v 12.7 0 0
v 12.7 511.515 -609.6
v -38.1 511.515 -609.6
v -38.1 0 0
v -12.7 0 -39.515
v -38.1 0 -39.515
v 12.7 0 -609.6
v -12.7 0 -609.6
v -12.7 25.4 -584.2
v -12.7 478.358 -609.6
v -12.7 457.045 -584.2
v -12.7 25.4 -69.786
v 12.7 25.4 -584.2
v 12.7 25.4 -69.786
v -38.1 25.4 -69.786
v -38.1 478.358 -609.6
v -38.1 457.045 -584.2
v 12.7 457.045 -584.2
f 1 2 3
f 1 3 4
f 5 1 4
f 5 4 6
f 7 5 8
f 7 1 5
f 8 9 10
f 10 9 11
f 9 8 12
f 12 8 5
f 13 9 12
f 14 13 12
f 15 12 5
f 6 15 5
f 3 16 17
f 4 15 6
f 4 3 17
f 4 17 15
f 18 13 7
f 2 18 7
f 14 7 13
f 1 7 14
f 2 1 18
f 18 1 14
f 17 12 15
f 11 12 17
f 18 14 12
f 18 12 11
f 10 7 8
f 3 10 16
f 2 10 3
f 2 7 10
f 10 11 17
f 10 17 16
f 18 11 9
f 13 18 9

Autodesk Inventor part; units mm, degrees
ref_plane "YZ Plane" through (0, 0, 0) normal (1, 0, 0) x (0, 1, 0)
ref_plane "XZ Plane" through (0, 0, 0) normal (0, 1, 0) x (-1, 0, 0)
ref_plane "XY Plane" through (0, 0, 0) normal (0, 0, 1) x (1, 0, 0)
sketch "Sketch1" plane through (0, 0, 0) normal (1, 0, 0) x (0, 1, 0)
  line L0 (0, 0) -> (0, -609.6)
  line L1 (0, -609.6) -> (511.5151, -609.6)
  line L2 (511.5151, -609.6) -> (0, 0)
  line L3 (25.4, -69.7859) -> (457.0447, -584.2)
  line L4 (457.0447, -584.2) -> (25.4, -584.2)
  line L5 (25.4, -584.2) -> (25.4, -69.7859)
  dimension "d0" = 609.6
  dimension "d1" = 40
  dimension "d2" = 25.4
  dimension "d3" = 25.4
  dimension "d4" = 25.4
extrude "Extrusion1" add sketch "Sketch1" along normal mid plane 25.4
sketch "Sketch2" plane through (-12.7, 0, 0) normal (-1, 0, 0) x (0, 0, 1)
  line L0 (-609.6, 0) -> (-609.6, 511.5151) projected
  line L1 (-609.6, 511.5151) -> (0, 0) projected
  line L2 (-609.6, 511.5151) -> (0, 0)
  line L3 (-69.7859, 25.4) -> (-584.2, 457.0447) projected
  line L4 (-584.2, 457.0447) -> (-39.5154, 0)
  line L5 (0, 0) -> (-609.6, 0) projected
  line L6 (-584.2, 457.0447) -> (-609.6, 478.3578)
  line L7 (-609.6, 511.5151) -> (-609.6, 478.3578)
  line L8 (-39.5154, 0) -> (0, 0)
extrude "Extrusion2" add sketch "Sketch2" along normal blind 25.4 contours L0 L1 L5 L4 L3 L6
properties part number "ballRampRightSideV04"
